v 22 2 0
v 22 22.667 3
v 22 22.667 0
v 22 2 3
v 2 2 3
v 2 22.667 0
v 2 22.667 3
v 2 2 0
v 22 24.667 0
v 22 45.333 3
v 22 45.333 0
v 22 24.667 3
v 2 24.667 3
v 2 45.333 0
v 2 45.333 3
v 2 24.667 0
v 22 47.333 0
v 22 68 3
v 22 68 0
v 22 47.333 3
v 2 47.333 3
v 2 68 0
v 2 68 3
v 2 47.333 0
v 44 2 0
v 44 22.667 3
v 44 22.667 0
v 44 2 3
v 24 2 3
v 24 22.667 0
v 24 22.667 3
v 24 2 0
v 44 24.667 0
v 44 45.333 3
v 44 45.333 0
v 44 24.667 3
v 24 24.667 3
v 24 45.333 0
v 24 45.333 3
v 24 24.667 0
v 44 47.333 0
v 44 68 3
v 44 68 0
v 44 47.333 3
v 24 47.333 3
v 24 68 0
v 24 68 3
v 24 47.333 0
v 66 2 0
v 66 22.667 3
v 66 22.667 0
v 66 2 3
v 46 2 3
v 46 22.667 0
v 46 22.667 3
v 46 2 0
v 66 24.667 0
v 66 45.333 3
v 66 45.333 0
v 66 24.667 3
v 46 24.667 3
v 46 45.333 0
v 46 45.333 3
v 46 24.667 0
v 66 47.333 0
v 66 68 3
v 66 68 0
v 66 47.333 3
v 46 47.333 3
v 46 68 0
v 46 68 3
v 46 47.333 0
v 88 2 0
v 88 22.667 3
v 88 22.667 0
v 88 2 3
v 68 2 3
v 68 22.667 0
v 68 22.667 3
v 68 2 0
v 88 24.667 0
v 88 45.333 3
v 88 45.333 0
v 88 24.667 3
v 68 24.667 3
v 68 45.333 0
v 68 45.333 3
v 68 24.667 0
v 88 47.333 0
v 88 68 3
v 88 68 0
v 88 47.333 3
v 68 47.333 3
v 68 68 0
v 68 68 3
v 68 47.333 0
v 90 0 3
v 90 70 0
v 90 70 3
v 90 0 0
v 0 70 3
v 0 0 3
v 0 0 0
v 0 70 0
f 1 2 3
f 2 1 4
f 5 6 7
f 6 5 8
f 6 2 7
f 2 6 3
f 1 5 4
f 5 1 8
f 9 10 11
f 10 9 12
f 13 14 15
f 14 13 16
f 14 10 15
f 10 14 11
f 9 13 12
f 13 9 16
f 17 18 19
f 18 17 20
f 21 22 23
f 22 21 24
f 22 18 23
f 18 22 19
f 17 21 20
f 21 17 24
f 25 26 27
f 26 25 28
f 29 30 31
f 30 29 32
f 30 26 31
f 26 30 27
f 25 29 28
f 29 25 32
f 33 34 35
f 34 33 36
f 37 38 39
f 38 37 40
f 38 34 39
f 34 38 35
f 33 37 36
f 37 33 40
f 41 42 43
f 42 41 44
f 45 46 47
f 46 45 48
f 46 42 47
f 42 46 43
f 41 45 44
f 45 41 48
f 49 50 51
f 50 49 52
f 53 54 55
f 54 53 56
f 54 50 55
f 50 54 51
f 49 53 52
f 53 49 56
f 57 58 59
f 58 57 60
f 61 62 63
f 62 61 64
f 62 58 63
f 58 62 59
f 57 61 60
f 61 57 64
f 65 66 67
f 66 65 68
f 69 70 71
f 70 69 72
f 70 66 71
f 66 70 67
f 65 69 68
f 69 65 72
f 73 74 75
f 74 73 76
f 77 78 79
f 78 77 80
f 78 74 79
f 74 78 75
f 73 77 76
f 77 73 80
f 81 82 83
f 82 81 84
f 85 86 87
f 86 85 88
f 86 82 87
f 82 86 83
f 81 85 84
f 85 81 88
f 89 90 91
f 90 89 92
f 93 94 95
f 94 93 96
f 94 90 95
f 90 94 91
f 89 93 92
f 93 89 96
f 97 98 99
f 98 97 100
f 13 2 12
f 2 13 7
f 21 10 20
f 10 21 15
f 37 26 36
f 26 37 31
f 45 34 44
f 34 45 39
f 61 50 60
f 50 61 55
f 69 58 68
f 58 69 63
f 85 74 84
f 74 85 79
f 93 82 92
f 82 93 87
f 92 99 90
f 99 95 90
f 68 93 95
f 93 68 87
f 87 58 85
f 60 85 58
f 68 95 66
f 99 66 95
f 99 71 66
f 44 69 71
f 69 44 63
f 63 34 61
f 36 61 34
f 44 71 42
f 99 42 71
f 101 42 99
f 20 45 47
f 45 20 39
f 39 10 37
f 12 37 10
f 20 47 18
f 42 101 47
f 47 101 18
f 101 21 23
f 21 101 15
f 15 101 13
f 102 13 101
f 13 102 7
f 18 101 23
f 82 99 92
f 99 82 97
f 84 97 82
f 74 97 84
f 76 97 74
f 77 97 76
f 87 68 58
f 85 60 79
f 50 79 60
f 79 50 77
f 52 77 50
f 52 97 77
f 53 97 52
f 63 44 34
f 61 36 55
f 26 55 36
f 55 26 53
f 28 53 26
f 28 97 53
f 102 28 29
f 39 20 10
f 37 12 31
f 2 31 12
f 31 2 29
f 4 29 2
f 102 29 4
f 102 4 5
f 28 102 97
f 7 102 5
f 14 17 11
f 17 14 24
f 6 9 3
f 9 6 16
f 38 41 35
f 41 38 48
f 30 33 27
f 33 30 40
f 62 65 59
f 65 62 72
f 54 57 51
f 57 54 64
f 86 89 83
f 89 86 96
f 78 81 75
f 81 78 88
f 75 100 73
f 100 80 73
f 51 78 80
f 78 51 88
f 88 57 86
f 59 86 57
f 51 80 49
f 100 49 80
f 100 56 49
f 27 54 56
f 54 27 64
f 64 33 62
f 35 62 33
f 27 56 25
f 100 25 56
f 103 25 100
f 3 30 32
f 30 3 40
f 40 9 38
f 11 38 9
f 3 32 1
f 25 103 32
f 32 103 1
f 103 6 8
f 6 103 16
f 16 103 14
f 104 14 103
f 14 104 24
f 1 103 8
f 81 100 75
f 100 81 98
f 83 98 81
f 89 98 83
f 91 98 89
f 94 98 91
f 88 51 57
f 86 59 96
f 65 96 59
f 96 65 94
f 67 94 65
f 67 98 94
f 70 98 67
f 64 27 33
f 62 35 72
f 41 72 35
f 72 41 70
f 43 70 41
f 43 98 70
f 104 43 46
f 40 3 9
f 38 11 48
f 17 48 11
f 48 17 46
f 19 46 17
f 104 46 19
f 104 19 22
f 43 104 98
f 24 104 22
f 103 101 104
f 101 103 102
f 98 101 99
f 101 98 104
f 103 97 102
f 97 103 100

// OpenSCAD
/*
  Mounting Plate  90 × 70 × 3 mm
  Lightened with a grid of pockets to reduce mass below 50% of solid.

  Solid volume = 90 × 70 × 3 = 18 900 mm³
  Target < 9 450 mm³

  Strategy: rectangular through-pockets arranged in a 3×4 grid, each pocket
  separated from neighbours and from the perimeter by ≥ 2 mm walls.

  Perimeter frame: 2 mm wall all round.
    Interior available: (90-4) × (70-4) = 86 × 66 mm

  Grid: 4 columns × 3 rows of pockets.
    Ribs between pockets: 2 mm.
    Pocket width  = (86 - 3×2) / 4 = (86-6)/4  = 80/4  = 20 mm
    Pocket height = (66 - 2×2) / 3 = (66-4)/3  = 62/3  ≈ 20.667 mm (use 20.6 mm to stay ≥2 mm rib)

  Exact rib check:
    col ribs: 4×20 + 3×2 = 80+6 = 86 ✓  (frame to frame)
    row ribs: 3×20.6 + 2×2 = 61.8+4 = 65.8 mm  → remaining = 66-65.8 = 0.2 mm → distribute:
      use row spacing 20.667 mm rounded so total = 3×20.6 = 61.8 → leftover 0.2 split into outer "rib" additions.
    Simplify: fix pocket_h = 62/3 exactly via parametric expression.

  Mass estimate (through-pockets, all material removed in Z):
    Solid area = 90×70 = 6 300 mm²
    Pocket area per pocket = 20 × (62/3) mm²  = 1 240/3 ≈ 413.33 mm²
    12 pockets total area removed = 12 × 413.33 = 4 960 mm²
    Remaining area = 6 300 - 4 960 = 1 340 mm²
    Volume remaining = 1 340 × 3 = 4 020 mm³
    Fraction = 4 020 / 18 900 ≈ 21.3%  < 50% ✓
    All walls ≥ 2 mm ✓

  Mounting holes: 4× M3 clearance (Ø 3.4 mm) at corners, 4 mm in from each edge.

  BOM:
    1× Mounting plate, 3D-printed, PLA/PETG
    4× M3×6 SHCS (customer-supplied)
*/

$fn = 60;

plate_w  = 90;
plate_d  = 70;
plate_h  =  3.0;

frame    =  2.0;   // perimeter wall thickness
rib      =  2.0;   // inter-pocket rib width

cols     =  4;
rows     =  3;

interior_w = plate_w - 2*frame;   // 86
interior_d = plate_d - 2*frame;   // 66

pocket_w = (interior_w - (cols-1)*rib) / cols;   // 20
pocket_d = (interior_d - (rows-1)*rib) / rows;   // 62/3

hole_d    = 3.4;   // M3 clearance
hole_inset = 4.0;

echo("--- Mounting Plate Manifest ---");
echo(str("Outer dims (W×D×H mm): ", plate_w, " × ", plate_d, " × ", plate_h));
echo(str("Pocket grid: ", cols, " cols × ", rows, " rows"));
echo(str("Pocket size (mm): ", pocket_w, " × ", pocket_d));
echo(str("Min wall (mm): ", frame, " (frame) / ", rib, " (rib)"));

solid_vol   = plate_w * plate_d * plate_h;
pocket_vol  = cols * rows * pocket_w * pocket_d * plate_h;
net_vol     = solid_vol - pocket_vol;
fill_ratio  = net_vol / solid_vol;

echo(str("Solid volume (mm³): ", solid_vol));
echo(str("Pocket volume removed (mm³): ", pocket_vol));
echo(str("Net volume (mm³): ", net_vol));
echo(str("Fill ratio: ", fill_ratio, "  (must be < 0.50)"));

difference() {
    // Base plate
    cube([plate_w, plate_d, plate_h]);

    // Lightening pockets (through-holes in Z)
    for (c = [0 : cols-1]) {
        for (r = [0 : rows-1]) {
            x = frame + c*(pocket_w + rib);
            y = frame + r*(pocket_d + rib);
            translate([x, y, -0.1])
                cube([pocket_w, pocket_d, plate_h + 0.2]);
        }
    }

    // Corner mounting holes
    for (xi = [hole_inset, plate_w - hole_inset])
        for (yi = [hole_inset, plate_d - hole_inset])
            translate([xi, yi, -0.1])
                cylinder(d=hole_d, h=plate_h + 0.2);
}
